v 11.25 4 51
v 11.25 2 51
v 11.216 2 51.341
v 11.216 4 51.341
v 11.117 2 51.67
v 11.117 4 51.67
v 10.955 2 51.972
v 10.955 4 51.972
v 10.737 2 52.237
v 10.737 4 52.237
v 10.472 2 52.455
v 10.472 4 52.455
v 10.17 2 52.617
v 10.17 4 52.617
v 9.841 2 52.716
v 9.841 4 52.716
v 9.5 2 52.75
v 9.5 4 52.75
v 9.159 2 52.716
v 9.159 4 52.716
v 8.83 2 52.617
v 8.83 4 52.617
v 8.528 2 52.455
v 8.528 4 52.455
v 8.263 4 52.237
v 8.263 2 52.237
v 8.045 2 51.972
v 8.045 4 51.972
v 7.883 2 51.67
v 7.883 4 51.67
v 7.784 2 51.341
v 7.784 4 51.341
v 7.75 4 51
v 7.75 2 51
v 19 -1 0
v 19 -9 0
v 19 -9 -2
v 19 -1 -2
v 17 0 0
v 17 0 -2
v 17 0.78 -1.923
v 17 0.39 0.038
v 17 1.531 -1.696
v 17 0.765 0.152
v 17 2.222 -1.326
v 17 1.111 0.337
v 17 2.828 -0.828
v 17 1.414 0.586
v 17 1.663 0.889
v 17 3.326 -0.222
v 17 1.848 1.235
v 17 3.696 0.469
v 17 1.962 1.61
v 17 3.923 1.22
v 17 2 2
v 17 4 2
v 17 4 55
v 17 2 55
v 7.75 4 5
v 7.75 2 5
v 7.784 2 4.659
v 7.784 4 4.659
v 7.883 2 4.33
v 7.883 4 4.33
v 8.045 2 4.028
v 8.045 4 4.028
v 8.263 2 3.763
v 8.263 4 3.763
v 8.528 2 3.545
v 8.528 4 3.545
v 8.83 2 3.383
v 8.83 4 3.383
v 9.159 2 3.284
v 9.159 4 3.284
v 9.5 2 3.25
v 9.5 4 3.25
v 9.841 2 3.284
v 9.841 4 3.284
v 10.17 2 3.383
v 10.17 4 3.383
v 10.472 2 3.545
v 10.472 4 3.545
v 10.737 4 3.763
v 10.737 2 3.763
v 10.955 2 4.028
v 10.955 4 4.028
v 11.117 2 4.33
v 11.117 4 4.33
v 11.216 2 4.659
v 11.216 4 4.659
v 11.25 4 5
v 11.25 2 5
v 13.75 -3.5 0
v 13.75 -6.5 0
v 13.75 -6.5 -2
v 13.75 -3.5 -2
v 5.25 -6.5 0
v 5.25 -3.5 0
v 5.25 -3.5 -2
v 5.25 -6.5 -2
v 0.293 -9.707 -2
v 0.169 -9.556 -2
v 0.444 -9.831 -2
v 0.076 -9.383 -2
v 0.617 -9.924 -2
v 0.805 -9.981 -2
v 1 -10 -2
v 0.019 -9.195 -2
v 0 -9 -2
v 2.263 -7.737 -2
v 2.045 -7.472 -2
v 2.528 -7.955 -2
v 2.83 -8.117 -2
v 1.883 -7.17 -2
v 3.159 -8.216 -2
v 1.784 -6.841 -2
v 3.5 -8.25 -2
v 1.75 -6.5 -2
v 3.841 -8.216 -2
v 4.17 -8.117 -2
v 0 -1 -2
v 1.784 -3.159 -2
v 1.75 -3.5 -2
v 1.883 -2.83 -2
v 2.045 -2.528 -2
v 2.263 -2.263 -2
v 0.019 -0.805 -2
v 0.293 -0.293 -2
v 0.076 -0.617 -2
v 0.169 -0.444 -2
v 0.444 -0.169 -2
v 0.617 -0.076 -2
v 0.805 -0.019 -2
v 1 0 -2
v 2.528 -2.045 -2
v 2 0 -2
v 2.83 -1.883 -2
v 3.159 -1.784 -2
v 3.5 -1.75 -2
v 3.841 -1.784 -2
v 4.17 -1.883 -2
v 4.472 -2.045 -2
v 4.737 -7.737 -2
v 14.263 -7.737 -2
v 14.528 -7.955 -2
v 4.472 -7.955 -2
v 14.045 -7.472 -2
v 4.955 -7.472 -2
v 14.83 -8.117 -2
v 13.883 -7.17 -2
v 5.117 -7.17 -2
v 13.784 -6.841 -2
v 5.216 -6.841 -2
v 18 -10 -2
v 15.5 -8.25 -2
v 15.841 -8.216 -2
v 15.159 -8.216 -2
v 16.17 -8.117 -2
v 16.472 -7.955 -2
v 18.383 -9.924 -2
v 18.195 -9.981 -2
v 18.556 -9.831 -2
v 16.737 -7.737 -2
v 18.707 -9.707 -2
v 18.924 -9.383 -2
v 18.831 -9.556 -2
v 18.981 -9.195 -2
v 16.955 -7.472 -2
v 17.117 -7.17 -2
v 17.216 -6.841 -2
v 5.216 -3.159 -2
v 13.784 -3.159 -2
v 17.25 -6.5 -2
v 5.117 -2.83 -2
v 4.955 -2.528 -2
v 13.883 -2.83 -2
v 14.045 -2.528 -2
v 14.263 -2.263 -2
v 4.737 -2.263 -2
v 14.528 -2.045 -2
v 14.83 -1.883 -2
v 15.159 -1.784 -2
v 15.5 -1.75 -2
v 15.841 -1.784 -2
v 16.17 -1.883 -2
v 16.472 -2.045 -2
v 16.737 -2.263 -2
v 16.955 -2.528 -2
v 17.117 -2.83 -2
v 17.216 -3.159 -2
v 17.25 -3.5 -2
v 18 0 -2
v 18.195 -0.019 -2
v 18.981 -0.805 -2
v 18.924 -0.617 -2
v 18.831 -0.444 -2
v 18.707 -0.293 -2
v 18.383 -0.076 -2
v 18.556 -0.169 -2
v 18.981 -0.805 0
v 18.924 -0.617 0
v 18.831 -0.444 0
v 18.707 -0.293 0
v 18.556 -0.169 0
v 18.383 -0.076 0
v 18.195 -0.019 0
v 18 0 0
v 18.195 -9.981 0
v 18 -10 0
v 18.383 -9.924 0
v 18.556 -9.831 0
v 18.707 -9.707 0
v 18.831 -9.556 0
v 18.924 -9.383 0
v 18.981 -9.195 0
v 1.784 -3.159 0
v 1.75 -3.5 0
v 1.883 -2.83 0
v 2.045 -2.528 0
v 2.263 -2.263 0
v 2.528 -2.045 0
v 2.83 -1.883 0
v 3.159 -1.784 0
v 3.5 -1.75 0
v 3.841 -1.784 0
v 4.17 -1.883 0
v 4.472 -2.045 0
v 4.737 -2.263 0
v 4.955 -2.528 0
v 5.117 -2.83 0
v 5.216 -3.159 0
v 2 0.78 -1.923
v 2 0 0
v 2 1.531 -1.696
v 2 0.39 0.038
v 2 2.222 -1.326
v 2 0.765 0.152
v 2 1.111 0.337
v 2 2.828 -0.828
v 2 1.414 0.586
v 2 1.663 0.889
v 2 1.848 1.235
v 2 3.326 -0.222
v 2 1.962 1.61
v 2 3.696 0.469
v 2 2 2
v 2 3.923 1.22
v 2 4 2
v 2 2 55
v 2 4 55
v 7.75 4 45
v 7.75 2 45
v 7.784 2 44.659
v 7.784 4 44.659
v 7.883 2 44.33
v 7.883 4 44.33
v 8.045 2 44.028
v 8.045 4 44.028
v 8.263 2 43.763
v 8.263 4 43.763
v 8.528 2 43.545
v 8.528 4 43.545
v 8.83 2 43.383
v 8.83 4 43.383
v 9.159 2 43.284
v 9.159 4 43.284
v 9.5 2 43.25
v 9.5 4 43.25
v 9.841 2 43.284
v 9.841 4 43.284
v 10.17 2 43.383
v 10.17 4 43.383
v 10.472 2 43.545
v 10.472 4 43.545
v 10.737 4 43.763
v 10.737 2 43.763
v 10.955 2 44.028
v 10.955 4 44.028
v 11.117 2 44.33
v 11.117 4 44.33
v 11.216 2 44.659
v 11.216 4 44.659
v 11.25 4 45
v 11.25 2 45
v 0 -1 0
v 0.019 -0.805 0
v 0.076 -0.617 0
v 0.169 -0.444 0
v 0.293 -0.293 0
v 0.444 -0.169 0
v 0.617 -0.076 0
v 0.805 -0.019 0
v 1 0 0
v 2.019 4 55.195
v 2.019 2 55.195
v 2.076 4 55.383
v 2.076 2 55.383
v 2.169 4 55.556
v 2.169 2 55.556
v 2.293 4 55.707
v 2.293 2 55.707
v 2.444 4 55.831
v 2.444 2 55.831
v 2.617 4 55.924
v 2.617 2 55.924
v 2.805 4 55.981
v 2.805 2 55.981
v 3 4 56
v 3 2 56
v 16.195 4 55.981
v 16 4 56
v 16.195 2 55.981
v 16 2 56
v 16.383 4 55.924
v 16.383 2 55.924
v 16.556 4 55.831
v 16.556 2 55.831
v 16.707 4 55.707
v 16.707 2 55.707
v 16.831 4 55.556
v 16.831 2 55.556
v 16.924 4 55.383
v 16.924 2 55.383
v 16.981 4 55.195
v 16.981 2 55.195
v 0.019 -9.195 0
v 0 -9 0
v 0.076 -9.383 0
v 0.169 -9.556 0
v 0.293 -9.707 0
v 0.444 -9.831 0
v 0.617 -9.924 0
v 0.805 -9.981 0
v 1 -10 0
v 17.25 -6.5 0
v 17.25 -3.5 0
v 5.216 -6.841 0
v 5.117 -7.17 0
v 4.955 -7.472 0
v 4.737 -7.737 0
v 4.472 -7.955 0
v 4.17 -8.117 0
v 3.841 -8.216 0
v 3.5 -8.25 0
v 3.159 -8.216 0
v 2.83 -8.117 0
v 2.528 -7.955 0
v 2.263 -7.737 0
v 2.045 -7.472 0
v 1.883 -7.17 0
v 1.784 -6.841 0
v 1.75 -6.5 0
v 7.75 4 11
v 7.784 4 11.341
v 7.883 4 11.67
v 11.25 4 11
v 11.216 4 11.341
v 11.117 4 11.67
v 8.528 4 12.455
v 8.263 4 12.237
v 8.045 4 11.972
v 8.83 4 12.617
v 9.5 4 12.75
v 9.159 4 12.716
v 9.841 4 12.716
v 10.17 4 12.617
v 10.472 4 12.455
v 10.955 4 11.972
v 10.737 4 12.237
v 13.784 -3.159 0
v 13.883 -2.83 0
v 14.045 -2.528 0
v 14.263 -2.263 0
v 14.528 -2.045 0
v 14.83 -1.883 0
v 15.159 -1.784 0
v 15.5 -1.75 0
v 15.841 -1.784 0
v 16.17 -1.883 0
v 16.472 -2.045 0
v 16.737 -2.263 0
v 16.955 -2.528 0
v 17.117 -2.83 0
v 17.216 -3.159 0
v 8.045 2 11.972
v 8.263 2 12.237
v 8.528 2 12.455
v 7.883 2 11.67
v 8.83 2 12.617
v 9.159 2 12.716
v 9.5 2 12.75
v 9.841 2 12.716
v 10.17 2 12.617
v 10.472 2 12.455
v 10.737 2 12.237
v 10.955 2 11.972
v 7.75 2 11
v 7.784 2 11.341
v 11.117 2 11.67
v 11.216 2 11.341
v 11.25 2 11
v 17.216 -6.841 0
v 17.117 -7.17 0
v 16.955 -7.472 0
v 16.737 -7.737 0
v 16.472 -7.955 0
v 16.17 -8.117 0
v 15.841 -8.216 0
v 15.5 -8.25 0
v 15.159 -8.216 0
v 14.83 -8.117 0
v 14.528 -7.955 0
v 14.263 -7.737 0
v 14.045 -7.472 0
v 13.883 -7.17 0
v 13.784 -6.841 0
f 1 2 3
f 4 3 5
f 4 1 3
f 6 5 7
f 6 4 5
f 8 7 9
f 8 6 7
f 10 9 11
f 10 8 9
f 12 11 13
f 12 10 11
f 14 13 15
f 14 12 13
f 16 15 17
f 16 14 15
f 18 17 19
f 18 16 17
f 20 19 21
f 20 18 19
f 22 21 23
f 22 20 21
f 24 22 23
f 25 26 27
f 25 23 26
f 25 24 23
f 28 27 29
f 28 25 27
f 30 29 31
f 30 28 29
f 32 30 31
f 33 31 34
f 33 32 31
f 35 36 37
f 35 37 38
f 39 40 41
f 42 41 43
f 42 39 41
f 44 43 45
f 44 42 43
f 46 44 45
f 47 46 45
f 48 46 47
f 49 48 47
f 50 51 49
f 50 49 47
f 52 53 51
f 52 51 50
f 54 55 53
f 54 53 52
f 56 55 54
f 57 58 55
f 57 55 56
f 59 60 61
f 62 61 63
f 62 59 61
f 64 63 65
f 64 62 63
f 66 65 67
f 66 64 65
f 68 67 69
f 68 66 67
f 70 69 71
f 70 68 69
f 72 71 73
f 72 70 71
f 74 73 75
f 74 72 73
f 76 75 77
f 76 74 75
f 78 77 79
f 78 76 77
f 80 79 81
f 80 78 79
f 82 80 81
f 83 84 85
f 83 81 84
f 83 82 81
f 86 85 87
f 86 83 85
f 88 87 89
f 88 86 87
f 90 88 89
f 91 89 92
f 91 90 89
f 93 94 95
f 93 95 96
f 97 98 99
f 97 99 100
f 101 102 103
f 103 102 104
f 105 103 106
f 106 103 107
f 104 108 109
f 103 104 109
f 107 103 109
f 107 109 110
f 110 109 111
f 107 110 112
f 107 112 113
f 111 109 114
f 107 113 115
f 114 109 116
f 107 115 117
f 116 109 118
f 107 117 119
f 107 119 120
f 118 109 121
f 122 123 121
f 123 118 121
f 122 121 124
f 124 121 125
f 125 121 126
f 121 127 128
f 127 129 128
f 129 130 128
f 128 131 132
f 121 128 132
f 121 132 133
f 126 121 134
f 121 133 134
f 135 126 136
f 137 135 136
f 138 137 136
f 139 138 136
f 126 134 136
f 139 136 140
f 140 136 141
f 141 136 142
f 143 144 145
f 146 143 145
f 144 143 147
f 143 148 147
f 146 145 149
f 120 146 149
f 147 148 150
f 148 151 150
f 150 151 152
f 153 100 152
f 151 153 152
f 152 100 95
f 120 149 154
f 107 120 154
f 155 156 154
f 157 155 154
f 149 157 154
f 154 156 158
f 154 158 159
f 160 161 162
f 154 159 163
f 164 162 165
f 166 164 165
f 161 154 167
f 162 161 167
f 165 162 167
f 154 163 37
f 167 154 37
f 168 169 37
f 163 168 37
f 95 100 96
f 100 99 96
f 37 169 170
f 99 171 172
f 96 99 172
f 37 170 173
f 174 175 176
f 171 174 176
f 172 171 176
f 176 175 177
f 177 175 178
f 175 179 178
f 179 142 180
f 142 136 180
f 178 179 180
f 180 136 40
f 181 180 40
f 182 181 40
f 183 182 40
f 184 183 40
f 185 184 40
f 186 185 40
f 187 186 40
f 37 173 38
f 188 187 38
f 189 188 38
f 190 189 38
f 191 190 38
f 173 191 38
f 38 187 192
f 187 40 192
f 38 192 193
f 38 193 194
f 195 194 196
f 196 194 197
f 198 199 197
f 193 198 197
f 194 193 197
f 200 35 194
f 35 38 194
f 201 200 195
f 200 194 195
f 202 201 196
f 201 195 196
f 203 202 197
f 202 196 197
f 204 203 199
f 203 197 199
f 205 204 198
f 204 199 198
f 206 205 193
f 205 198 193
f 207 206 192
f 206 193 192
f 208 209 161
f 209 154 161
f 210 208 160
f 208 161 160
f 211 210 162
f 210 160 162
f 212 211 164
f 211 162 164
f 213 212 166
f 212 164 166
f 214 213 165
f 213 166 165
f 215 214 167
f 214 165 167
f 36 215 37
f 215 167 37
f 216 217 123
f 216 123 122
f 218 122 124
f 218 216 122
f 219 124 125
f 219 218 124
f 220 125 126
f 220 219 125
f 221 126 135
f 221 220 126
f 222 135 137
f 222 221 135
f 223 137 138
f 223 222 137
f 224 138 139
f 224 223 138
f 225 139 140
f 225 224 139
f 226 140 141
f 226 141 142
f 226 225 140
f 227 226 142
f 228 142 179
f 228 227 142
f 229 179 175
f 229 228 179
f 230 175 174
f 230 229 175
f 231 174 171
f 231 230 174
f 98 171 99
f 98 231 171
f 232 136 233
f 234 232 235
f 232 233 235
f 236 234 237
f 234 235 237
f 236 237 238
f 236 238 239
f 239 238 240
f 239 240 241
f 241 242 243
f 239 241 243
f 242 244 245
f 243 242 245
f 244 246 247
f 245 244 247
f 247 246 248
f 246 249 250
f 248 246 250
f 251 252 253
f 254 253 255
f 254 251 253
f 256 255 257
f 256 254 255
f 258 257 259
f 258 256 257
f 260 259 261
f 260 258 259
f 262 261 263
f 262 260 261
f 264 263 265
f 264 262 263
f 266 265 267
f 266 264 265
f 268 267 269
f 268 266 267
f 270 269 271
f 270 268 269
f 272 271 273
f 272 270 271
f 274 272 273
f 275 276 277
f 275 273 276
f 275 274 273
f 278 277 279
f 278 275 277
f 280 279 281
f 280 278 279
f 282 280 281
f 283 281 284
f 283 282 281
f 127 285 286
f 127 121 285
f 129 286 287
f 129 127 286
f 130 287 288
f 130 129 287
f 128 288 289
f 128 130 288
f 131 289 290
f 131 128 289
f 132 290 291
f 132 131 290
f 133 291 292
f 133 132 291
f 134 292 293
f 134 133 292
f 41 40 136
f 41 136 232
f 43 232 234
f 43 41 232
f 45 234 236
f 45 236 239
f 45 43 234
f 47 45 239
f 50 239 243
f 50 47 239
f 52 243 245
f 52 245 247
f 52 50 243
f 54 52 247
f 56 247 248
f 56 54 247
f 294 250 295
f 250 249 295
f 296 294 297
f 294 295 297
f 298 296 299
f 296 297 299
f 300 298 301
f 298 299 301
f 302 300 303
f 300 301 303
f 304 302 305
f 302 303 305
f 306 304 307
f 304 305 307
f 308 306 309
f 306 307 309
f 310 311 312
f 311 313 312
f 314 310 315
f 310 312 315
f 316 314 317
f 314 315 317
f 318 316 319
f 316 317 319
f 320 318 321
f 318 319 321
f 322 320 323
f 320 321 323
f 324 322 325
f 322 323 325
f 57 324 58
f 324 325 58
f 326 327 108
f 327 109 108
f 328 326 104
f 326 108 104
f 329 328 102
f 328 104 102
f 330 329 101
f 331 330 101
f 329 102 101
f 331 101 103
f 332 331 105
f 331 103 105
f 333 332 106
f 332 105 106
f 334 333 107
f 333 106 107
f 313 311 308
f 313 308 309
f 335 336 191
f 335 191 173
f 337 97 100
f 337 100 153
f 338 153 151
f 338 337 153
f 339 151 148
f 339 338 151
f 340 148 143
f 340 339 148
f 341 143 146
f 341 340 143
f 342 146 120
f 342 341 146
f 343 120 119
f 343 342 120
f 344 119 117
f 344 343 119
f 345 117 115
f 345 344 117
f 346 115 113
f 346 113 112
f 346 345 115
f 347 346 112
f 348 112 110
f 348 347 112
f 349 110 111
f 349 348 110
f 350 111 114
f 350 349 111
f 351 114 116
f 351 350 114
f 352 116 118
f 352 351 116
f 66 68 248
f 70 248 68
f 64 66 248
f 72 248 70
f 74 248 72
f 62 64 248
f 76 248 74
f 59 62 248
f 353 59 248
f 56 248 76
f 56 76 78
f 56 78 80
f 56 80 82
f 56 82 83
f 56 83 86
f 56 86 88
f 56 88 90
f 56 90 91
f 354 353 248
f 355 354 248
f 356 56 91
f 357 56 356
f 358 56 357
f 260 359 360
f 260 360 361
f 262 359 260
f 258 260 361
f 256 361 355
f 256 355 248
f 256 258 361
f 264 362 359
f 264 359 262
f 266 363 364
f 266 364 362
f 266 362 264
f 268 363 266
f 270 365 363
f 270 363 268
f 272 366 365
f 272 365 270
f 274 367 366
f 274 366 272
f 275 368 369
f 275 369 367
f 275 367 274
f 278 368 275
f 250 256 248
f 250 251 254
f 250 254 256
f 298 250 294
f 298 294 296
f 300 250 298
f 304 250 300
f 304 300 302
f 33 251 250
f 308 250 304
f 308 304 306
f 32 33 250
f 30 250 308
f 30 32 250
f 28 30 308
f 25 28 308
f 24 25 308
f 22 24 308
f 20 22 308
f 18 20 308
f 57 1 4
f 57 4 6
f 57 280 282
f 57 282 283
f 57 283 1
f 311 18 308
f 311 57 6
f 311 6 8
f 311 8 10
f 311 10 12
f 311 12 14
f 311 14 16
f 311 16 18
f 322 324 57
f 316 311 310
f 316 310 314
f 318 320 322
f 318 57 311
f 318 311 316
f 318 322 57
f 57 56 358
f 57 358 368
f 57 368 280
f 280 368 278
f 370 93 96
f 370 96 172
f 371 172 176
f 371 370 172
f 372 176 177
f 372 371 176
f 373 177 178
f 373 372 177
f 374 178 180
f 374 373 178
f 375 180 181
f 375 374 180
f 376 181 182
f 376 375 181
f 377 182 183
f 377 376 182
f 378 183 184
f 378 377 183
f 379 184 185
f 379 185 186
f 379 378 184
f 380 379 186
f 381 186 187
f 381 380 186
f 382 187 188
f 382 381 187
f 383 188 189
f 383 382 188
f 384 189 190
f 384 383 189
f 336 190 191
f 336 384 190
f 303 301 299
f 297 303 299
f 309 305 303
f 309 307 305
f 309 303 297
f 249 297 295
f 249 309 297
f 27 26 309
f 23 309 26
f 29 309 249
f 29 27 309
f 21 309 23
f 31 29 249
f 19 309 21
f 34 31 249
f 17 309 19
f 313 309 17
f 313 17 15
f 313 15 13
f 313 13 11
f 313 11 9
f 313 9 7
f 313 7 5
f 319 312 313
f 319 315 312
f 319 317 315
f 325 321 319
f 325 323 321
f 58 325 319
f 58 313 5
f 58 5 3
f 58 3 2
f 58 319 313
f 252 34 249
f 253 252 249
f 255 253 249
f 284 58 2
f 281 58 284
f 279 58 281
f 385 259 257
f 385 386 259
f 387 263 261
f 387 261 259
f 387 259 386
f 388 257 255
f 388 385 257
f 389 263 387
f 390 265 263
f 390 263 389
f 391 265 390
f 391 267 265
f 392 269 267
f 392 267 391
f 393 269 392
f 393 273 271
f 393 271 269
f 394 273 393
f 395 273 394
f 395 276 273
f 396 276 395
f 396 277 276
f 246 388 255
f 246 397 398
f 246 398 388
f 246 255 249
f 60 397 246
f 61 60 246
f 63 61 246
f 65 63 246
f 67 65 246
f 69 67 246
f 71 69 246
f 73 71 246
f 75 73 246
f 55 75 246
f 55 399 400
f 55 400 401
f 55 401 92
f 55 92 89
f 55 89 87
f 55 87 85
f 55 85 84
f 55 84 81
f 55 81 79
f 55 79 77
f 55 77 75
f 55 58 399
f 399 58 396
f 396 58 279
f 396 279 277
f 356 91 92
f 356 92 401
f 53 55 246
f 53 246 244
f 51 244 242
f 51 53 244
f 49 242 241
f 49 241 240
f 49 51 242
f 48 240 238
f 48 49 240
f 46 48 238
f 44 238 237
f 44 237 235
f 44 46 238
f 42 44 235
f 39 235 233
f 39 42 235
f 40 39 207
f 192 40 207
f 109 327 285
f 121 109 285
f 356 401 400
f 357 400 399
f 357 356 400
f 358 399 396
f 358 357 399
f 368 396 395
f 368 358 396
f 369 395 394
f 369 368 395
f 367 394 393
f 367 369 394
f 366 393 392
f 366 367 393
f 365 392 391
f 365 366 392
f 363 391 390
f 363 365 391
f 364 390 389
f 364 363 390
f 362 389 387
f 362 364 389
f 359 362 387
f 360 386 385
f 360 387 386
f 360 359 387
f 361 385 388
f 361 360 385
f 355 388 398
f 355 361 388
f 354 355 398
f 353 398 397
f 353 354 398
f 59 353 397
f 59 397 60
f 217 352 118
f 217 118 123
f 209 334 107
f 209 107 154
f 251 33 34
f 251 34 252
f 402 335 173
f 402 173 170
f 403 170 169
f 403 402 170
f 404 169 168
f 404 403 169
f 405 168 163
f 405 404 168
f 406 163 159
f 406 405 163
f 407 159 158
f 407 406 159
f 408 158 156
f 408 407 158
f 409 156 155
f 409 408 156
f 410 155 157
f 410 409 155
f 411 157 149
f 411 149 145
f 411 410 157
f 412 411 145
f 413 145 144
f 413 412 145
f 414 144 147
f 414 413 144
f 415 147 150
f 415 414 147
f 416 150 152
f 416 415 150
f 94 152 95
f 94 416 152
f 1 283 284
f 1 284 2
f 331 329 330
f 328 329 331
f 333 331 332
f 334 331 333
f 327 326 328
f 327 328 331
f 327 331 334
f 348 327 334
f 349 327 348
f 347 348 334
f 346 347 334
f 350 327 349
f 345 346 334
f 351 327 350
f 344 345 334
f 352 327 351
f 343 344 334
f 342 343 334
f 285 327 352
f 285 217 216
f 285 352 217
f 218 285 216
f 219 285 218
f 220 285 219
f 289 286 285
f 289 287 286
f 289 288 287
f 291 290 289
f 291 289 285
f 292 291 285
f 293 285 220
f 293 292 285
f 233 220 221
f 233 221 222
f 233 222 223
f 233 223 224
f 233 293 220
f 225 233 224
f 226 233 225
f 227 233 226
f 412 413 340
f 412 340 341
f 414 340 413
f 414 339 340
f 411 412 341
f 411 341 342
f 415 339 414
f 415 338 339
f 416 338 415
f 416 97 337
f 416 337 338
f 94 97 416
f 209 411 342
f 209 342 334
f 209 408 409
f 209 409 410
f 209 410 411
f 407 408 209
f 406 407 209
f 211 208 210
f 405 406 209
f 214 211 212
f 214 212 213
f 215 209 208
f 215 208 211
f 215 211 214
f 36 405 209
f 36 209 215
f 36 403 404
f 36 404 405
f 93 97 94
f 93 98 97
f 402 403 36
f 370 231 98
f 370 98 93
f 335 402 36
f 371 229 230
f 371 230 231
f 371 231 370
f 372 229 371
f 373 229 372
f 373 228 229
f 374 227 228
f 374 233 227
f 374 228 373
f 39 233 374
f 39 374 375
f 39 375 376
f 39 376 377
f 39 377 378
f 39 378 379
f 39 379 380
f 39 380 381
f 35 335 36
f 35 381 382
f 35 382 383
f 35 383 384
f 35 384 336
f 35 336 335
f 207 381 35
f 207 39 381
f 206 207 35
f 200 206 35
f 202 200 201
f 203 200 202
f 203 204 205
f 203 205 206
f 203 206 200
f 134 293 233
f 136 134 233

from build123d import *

# Parameters (mm, degrees)
CROQUIS1_W             = 19
CROQUIS1_H             = 10
BRIDA_BASE1_DEPTH      = 2
BRIDA_DE_ARISTA1_DEPTH = 15
CORTAR_EXTRUIR1_REACH  = 62.77
REDONDEO1_R            = 1


# Sheet-metal steps are written as plain solids
with BuildPart() as part:
    # Croquis1 → Brida base1 (new body)
    with BuildSketch(Plane.XY):
        with Locations((9.5, -5)):
            Rectangle(CROQUIS1_W, CROQUIS1_H)
        with BuildLine():
            Line((5.25, -3.5), (5.25, -6.5))
            ThreePointArc((5.25, -6.5), (3.5, -8.25), (1.75, -6.5))
            Line((1.75, -6.5), (1.75, -3.5))
            ThreePointArc((1.75, -3.5), (3.5, -1.75), (5.25, -3.5))
        make_face(mode=Mode.SUBTRACT)
        with BuildLine():
            Line((17.25, -3.5), (17.25, -6.5))
            ThreePointArc((17.25, -6.5), (15.5, -8.25), (13.75, -6.5))
            Line((13.75, -6.5), (13.75, -3.5))
            ThreePointArc((13.75, -3.5), (15.5, -1.75), (17.25, -3.5))
        make_face(mode=Mode.SUBTRACT)
    extrude(amount=-BRIDA_BASE1_DEPTH)

    # Brida de arista1 section (across the edge) → Brida de arista1 (add)
    with BuildSketch(Plane(origin=(17, 2, 0), x_dir=(0, -1, 0), z_dir=(-1, 0, 0))):
        with BuildLine():
            Line((-2, 2), (-2, 56))
            Line((-2, 56), (0, 56))
            Line((0, 56), (0, 2))
            ThreePointArc((0, 2), (0.585786438, 0.585786438), (2, 0))
            Line((2, 0), (2, -2))
            ThreePointArc((2, -2), (-0.828427125, -0.828427125), (-2, 2))
        make_face()
    extrude(amount=BRIDA_DE_ARISTA1_DEPTH)

    # Croquis9 → Cortar-Extruir1 (cut, up to next)
    with BuildSketch(Plane(origin=(0, 4, 0), x_dir=(1, 0, 0), z_dir=(0, 1, 0)), mode=Mode.PRIVATE) as cortar_extruir1_sk1:
        with BuildLine():
            Line((7.75, -11), (7.75, -5))
            ThreePointArc((7.75, -5), (9.5, -3.25), (11.25, -5))
            Line((11.25, -5), (11.25, -11))
            ThreePointArc((11.25, -11), (9.5, -12.75), (7.75, -11))
        make_face()
    cortar_extruir1_tool1 = extrude(cortar_extruir1_sk1.sketch, amount=-CORTAR_EXTRUIR1_REACH, mode=Mode.PRIVATE) & part.part
    # Croquis9 → Cortar-Extruir1 (cut, up to next)
    with BuildSketch(Plane(origin=(0, 4, 0), x_dir=(1, 0, 0), z_dir=(0, 1, 0)), mode=Mode.PRIVATE) as cortar_extruir1_sk2:
        with BuildLine():
            Line((7.75, -51), (7.75, -45))
            ThreePointArc((7.75, -45), (9.5, -43.25), (11.25, -45))
            Line((11.25, -45), (11.25, -51))
            ThreePointArc((11.25, -51), (9.5, -52.75), (7.75, -51))
        make_face()
    cortar_extruir1_tool2 = extrude(cortar_extruir1_sk2.sketch, amount=-CORTAR_EXTRUIR1_REACH, mode=Mode.PRIVATE) & part.part
    add(cortar_extruir1_tool1.solids().sort_by_distance((9.5, 4, 8))[0], mode=Mode.SUBTRACT)
    add(cortar_extruir1_tool2.solids().sort_by_distance((9.5, 4, 48))[0], mode=Mode.SUBTRACT)

    # Redondeo1
    redondeo1_edges = [part.edges().sort_by_distance(p)[0] for p in [
        (17, 3, 56),
        (2, 3, 56),
        (0, 0, -1),
        (19, 0, -1),
        (19, -10, -1),
        (0, -10, -1),
    ]]
    fillet(redondeo1_edges, radius=REDONDEO1_R)


solid = part.part
